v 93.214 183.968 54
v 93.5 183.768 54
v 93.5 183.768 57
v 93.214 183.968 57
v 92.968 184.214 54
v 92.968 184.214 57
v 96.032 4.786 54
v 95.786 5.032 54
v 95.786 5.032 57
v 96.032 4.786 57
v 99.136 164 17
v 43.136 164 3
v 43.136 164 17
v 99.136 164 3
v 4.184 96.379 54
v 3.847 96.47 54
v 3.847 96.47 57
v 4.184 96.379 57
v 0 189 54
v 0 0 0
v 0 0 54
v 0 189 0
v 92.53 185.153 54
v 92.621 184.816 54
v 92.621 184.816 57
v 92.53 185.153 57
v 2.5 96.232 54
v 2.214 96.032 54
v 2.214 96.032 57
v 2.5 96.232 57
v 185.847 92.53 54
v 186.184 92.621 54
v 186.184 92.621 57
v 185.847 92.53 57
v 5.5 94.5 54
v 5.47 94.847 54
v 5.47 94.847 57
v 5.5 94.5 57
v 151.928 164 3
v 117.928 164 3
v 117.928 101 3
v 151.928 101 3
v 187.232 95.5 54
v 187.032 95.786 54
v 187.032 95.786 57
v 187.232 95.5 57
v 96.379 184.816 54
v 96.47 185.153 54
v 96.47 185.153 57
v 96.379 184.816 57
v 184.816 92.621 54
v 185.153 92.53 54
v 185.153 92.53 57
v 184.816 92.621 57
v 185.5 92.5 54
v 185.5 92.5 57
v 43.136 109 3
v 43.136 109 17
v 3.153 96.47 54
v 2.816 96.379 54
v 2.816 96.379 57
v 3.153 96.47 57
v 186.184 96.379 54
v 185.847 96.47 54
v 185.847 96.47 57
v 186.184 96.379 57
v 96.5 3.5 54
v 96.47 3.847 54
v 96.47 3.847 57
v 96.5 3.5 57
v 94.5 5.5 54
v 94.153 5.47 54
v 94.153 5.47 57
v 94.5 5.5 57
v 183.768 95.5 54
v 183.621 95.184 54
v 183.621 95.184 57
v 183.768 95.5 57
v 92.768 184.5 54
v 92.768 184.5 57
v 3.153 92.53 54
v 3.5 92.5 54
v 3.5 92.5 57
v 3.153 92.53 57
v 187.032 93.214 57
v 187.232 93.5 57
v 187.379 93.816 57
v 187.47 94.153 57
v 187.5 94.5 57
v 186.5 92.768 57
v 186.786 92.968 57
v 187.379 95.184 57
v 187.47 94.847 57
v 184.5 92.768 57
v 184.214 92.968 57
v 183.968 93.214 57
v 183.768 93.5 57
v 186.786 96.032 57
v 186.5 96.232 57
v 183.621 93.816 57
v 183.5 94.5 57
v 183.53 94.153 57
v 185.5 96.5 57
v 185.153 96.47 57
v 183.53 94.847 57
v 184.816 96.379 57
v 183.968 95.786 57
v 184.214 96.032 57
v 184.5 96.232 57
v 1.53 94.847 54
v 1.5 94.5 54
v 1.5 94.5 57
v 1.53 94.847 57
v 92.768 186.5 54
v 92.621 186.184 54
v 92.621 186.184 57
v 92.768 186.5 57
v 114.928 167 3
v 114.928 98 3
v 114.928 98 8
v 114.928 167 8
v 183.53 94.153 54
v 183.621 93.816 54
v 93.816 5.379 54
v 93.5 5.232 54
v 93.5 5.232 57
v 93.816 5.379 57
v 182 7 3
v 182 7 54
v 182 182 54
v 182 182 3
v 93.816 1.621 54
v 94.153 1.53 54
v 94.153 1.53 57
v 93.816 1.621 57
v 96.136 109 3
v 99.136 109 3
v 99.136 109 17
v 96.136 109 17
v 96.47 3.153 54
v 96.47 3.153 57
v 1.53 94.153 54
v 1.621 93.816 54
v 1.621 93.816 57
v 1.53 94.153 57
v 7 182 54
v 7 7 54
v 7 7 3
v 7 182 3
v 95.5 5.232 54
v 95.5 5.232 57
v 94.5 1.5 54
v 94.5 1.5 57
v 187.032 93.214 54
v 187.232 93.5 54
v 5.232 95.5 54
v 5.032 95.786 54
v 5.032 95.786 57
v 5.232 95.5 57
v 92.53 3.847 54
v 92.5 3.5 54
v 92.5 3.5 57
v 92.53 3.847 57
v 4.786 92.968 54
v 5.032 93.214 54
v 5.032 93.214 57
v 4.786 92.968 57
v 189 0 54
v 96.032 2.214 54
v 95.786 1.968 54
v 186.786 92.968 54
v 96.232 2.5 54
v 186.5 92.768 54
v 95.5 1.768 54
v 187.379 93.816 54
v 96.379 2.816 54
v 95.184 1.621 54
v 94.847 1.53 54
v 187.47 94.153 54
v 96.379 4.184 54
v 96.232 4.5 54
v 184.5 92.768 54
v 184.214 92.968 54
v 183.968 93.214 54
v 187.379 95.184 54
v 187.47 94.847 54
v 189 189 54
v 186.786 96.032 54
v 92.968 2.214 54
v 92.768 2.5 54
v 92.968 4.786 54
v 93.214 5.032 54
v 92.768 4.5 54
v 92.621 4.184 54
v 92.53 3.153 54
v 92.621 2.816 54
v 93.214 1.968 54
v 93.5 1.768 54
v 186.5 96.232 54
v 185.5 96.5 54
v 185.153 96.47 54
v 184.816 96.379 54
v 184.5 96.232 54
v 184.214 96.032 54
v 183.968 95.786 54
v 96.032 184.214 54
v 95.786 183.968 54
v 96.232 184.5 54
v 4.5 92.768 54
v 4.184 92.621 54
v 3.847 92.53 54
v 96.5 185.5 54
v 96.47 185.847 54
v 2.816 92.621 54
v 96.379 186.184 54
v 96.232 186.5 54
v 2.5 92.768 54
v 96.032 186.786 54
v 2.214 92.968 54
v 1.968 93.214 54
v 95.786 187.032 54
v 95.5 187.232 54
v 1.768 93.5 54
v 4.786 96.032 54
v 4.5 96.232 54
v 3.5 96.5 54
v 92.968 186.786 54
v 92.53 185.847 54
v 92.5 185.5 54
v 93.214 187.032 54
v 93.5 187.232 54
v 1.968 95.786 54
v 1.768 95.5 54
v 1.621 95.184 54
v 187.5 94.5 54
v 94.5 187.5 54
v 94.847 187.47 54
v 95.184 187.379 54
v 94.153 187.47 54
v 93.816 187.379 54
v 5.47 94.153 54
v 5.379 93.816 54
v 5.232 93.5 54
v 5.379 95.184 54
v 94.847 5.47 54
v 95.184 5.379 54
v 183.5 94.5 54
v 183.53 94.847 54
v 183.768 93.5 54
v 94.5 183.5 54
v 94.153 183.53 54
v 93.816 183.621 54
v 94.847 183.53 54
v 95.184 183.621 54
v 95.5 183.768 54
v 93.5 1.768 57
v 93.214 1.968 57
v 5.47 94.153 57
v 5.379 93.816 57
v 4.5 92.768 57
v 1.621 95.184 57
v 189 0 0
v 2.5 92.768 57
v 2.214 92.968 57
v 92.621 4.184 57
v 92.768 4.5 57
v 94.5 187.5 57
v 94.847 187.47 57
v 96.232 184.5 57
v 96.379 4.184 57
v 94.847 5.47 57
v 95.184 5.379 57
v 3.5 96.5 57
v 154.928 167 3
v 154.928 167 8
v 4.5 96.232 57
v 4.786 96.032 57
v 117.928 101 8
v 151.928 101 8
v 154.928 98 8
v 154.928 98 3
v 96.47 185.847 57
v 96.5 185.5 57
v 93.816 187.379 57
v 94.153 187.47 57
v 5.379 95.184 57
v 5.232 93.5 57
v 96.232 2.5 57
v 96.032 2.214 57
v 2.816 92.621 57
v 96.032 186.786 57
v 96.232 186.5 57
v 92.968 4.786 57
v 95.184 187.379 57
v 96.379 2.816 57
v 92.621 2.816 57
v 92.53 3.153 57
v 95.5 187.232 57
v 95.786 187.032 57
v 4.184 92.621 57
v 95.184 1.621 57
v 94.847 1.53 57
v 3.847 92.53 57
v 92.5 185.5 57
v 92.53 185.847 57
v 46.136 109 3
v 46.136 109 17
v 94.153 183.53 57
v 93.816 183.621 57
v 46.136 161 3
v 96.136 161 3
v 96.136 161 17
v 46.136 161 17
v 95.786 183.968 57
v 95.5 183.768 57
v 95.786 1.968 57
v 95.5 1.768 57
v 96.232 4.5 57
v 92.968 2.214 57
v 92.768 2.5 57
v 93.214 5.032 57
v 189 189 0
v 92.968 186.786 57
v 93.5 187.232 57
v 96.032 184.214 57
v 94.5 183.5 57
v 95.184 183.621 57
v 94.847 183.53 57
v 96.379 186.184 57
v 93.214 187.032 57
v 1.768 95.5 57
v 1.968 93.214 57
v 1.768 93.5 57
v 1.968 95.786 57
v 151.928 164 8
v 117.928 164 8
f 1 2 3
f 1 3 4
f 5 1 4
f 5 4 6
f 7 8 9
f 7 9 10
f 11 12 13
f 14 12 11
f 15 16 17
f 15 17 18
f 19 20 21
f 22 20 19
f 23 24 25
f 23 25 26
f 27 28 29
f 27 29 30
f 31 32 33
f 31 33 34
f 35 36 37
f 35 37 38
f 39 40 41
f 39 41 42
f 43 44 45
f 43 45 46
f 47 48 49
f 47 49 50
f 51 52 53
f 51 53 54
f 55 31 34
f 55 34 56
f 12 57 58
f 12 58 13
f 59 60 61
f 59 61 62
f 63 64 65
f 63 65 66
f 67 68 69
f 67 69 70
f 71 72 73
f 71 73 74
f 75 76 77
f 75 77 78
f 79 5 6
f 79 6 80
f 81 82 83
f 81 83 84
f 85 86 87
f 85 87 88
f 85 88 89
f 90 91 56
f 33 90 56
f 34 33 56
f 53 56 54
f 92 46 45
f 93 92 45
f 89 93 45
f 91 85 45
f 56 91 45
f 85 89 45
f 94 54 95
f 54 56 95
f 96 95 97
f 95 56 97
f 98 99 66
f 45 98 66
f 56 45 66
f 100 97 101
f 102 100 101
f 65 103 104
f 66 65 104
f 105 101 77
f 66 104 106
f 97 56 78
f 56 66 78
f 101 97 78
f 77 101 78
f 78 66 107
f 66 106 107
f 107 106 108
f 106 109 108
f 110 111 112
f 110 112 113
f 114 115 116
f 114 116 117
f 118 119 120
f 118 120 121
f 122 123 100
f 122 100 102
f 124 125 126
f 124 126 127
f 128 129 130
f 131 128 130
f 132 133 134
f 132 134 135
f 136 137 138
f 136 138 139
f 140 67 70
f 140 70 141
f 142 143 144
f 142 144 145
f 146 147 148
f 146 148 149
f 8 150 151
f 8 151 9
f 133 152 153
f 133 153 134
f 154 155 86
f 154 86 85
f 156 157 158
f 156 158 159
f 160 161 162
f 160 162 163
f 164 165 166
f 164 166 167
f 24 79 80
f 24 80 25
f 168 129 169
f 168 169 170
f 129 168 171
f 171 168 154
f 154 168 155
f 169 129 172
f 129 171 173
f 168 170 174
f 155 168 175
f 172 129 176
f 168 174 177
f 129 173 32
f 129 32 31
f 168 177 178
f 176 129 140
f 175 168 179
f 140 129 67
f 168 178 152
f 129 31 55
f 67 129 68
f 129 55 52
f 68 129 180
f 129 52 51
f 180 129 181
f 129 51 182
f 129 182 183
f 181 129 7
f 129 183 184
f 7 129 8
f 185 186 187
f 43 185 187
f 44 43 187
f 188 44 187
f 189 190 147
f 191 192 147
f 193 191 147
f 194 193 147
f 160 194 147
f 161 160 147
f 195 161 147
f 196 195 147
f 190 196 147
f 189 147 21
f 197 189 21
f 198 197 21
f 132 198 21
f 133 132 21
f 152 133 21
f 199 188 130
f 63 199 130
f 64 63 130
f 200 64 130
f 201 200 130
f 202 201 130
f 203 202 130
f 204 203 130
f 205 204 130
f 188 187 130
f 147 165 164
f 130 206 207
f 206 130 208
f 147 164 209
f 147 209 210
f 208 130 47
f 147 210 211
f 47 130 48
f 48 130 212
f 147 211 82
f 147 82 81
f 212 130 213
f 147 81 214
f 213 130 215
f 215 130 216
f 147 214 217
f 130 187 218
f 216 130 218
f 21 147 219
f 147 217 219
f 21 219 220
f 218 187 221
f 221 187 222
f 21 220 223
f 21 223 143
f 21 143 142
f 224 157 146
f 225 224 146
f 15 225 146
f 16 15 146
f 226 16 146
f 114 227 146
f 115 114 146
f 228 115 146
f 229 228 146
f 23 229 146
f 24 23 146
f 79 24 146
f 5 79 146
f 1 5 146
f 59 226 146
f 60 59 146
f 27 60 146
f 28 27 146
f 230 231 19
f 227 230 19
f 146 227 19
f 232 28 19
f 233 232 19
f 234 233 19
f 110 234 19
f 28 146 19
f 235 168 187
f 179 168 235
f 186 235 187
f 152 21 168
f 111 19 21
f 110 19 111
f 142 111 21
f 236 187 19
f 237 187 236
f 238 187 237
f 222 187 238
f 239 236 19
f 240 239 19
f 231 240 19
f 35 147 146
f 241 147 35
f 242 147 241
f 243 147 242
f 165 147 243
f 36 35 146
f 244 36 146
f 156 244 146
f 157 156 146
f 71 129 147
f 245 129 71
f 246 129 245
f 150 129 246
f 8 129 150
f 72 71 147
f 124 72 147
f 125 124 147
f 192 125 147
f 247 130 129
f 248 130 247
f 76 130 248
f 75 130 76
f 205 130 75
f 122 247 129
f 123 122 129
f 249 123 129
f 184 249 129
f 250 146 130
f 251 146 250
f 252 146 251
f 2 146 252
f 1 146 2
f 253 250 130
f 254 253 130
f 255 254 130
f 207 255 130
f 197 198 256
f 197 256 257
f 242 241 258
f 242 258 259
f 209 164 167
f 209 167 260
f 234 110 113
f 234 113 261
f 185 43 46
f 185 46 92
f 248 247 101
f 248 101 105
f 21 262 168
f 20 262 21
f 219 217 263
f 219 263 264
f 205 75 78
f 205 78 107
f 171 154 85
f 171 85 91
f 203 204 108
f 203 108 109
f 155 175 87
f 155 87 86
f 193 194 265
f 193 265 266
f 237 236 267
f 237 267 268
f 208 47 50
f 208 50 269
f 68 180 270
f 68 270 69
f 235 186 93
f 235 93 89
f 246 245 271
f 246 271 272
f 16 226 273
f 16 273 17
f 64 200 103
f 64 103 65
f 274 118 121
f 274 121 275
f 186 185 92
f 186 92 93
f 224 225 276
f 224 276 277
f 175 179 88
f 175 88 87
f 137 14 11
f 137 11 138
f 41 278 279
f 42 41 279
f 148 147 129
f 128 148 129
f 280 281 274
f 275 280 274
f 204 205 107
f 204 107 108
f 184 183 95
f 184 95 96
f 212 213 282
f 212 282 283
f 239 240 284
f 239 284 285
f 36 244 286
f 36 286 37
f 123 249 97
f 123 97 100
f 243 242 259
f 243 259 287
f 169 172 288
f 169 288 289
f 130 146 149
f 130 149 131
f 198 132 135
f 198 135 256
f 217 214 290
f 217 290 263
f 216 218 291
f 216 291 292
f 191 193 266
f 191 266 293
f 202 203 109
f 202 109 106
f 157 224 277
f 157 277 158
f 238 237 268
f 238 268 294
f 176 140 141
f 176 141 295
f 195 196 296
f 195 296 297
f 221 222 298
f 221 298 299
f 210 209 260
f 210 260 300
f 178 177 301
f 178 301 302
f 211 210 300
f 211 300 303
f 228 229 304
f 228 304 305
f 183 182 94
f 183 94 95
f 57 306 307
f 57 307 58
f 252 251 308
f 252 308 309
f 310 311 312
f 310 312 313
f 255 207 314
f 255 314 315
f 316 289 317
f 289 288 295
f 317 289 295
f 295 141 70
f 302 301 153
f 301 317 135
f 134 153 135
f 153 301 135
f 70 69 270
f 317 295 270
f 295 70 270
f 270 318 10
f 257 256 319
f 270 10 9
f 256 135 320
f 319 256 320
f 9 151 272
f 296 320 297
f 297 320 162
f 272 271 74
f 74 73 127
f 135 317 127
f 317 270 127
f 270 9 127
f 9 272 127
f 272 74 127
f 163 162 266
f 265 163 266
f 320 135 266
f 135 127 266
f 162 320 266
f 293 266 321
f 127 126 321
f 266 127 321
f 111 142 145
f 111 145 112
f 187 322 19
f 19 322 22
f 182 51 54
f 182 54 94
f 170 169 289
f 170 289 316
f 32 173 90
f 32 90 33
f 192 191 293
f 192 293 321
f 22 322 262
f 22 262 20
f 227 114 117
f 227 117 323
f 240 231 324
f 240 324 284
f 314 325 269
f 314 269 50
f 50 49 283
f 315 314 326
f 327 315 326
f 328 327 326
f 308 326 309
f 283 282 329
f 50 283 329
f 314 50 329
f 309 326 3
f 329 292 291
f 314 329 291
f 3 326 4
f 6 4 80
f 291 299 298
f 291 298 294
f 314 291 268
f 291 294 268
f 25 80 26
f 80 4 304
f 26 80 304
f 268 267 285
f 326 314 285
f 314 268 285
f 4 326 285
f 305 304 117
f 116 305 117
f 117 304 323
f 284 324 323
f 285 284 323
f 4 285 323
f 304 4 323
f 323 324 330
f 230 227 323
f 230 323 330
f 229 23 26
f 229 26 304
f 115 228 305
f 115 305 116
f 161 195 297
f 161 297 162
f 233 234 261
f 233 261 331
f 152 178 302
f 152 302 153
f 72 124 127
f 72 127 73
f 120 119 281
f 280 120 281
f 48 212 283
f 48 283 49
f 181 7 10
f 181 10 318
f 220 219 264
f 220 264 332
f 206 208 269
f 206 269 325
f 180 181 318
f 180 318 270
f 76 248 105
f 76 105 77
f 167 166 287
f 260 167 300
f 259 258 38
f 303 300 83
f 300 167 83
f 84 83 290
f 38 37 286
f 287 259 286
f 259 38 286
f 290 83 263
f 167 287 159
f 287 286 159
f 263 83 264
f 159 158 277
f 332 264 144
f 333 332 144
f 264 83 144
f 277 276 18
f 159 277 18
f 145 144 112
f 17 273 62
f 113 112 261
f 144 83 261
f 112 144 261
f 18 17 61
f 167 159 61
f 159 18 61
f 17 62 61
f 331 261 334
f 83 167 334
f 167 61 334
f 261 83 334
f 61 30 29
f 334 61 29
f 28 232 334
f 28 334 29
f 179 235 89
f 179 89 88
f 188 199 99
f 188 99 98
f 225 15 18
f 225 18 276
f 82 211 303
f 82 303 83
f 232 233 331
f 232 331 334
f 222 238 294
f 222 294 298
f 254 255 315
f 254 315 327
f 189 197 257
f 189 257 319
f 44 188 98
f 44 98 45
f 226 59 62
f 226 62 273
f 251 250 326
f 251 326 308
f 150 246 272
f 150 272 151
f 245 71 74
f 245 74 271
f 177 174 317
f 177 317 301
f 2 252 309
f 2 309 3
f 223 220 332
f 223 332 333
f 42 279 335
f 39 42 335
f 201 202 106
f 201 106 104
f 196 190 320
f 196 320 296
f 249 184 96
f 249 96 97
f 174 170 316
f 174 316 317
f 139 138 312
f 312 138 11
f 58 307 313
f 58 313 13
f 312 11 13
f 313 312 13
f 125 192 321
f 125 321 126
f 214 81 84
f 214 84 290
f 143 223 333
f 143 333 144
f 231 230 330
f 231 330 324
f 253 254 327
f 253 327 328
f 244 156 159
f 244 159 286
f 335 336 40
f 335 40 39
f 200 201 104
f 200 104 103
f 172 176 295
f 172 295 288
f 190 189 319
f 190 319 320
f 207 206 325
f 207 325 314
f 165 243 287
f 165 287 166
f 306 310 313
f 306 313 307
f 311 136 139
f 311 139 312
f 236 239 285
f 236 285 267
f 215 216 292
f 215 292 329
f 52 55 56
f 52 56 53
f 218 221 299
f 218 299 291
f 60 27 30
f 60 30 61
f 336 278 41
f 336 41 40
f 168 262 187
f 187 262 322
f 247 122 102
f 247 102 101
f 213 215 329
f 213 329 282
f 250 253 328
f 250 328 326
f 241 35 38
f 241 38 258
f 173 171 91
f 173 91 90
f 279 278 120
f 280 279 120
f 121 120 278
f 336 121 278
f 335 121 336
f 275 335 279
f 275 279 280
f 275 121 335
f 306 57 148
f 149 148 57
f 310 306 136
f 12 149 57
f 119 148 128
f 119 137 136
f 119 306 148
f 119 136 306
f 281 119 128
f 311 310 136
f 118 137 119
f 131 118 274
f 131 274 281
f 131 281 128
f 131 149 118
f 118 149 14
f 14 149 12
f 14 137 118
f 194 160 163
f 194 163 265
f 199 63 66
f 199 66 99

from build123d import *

# Parameters (mm, degrees)
SKETCH1_W           = 188.999995589
SKETCH1_H           = 188.999995589
BOSS_EXTRUDE1_DEPTH = 54.000001401
BOSS_EXTRUDE2_DEPTH = 2.999998629
BOSS_EXTRUDE3_DEPTH = 2.999998629
BOSS_EXTRUDE4_DEPTH = 2.999998629
BOSS_EXTRUDE5_DEPTH = 2.999998629
SKETCH6_W           = 174.999997486
SKETCH6_H           = 174.999997486
CUT_EXTRUDE1_DEPTH  = 51.000001375
BOSS_EXTRUDE6_DEPTH = 14.000000898
SKETCH8_W           = 40.000014007
SKETCH8_H           = 68.999998271
BOSS_EXTRUDE7_DEPTH = 5.000000354
SKETCH9_W           = 34.000001848
SKETCH9_H           = 63.000008464
CUT_EXTRUDE2_DEPTH  = 5.000000354


with BuildPart() as part:
    # Sketch1 → Boss-Extrude1 (new body)
    with BuildSketch(Plane(origin=(0, 0, 0), x_dir=(-1, 0, 0), z_dir=(0, 0, -1))):
        with Locations((-94.499997795, 94.499997795)):
            Rectangle(SKETCH1_W, SKETCH1_H)
    extrude(amount=-BOSS_EXTRUDE1_DEPTH)

    # Sketch2 → Boss-Extrude2 (add)
    with BuildSketch(Plane.XY.offset(54.000001401)):
        Polygon((3.152705729, 96.469610929), (3.49999941, 96.500001848), (3.847301006, 96.469610929), (4.184044898, 96.379376948), (4.500002135, 96.232049167), (4.785574973, 96.032083035), (5.032091867, 95.785565674), (5.232051015, 95.499992371), (5.379386246, 95.184035599), (5.469620228, 94.847291708), (5.500003695, 94.499990344), (5.469620228, 94.152703881), (5.379386246, 93.815952539), (5.232051015, 93.499995768), (5.032091867, 93.214422464), (4.785574973, 92.967912555), (4.500002135, 92.767946422), (4.184044898, 92.620611191), (3.847301006, 92.530377209), (3.49999941, 92.500001192), (3.152705729, 92.530377209), (2.815961838, 92.620611191), (2.500005066, 92.767946422), (2.214424312, 92.967912555), (1.967914402, 93.214422464), (1.76794827, 93.499995768), (1.620620489, 93.815952539), (1.530386391, 94.152703881), (1.500003156, 94.499990344), (1.530386391, 94.847291708), (1.620620489, 95.184035599), (1.76794827, 95.499992371), (1.967914402, 95.785565674), (2.214424312, 96.032083035), (2.500005066, 96.232049167), (2.815961838, 96.379376948), align=None)
    extrude(amount=BOSS_EXTRUDE2_DEPTH)

    # Sketch3 → Boss-Extrude3 (add)
    with BuildSketch(Plane.XY.offset(54.000001401)):
        Polygon((96.032090485, 184.214413166), (95.785573125, 183.967918158), (95.499999821, 183.767944574), (95.18404305, 183.620601892), (94.847299159, 183.530375361), (94.499997795, 183.500006795), (94.152703881, 183.530375361), (93.815967441, 183.620601892), (93.500003219, 183.767944574), (93.214422464, 183.967918158), (92.967912555, 184.214413166), (92.767953873, 184.49999392), (92.620611191, 184.815958142), (92.53038466, 185.152694583), (92.500001192, 185.499995947), (92.53038466, 185.847297311), (92.620611191, 186.184033751), (92.767953873, 186.499997973), (92.967912555, 186.785563827), (93.214422464, 187.032088637), (93.500003219, 187.232047319), (93.815967441, 187.3793751), (94.152703881, 187.469601631), (94.499997795, 187.5), (94.847299159, 187.469601631), (95.18404305, 187.3793751), (95.499999821, 187.232047319), (95.785573125, 187.032088637), (96.032090485, 186.785563827), (96.232056618, 186.499997973), (96.379384398, 186.184033751), (96.46961838, 185.847297311), (96.500001848, 185.499995947), (96.46961838, 185.152694583), (96.379384398, 184.815958142), (96.232056618, 184.49999392), align=None)
    extrude(amount=BOSS_EXTRUDE3_DEPTH)

    # Sketch4 → Boss-Extrude4 (add)
    with BuildSketch(Plane.XY.offset(54.000001401)):
        Polygon((185.847297311, 92.530377209), (185.499995947, 92.500001192), (185.152694583, 92.530377209), (184.815958142, 92.620611191), (184.49999392, 92.767946422), (184.214428067, 92.967912555), (183.967918158, 93.214422464), (183.767959476, 93.499995768), (183.620616794, 93.815952539), (183.530375361, 94.152703881), (183.500006795, 94.499990344), (183.530375361, 94.847291708), (183.620616794, 95.184035599), (183.767959476, 95.499992371), (183.967918158, 95.785565674), (184.214428067, 96.032083035), (184.49999392, 96.232049167), (184.815958142, 96.379376948), (185.152694583, 96.469610929), (185.499995947, 96.500001848), (185.847297311, 96.469610929), (186.184033751, 96.379376948), (186.499997973, 96.232049167), (186.785578728, 96.032083035), (187.032088637, 95.785565674), (187.232062221, 95.499992371), (187.379390001, 95.184035599), (187.469616532, 94.847291708), (187.5, 94.499990344), (187.469616532, 94.152703881), (187.379390001, 93.815952539), (187.232062221, 93.499995768), (187.032088637, 93.214422464), (186.785578728, 92.967912555), (186.499997973, 92.767946422), (186.184033751, 92.620611191), align=None)
    extrude(amount=BOSS_EXTRUDE4_DEPTH)

    # Sketch5 → Boss-Extrude5 (add)
    with BuildSketch(Plane.XY.offset(54.000001401)):
        Polygon((92.967912555, 2.214424312), (92.767953873, 2.499997616), (92.620611191, 2.815954387), (92.53038466, 3.152698278), (92.500001192, 3.49999941), (92.53038466, 3.847293556), (92.620611191, 4.184036981), (92.767953873, 4.499994218), (92.967912555, 4.785574973), (93.214422464, 5.032084882), (93.500003219, 5.232051015), (93.815967441, 5.379378796), (94.152703881, 5.469612777), (94.499997795, 5.499996245), (94.847299159, 5.469612777), (95.18404305, 5.379378796), (95.499999821, 5.232051015), (95.785573125, 5.032084882), (96.032090485, 4.785574973), (96.232056618, 4.499994218), (96.379384398, 4.184036981), (96.46961838, 3.847293556), (96.500001848, 3.49999941), (96.46961838, 3.152698278), (96.379384398, 2.815954387), (96.232056618, 2.499997616), (96.032090485, 2.214424312), (95.785573125, 1.967906952), (95.499999821, 1.76794827), (95.18404305, 1.620613155), (94.847299159, 1.530379057), (94.499997795, 1.499995589), (94.152703881, 1.530379057), (93.815967441, 1.620613155), (93.500003219, 1.76794827), (93.214422464, 1.967906952), align=None)
    extrude(amount=BOSS_EXTRUDE5_DEPTH)

    # Sketch6 → Cut-Extrude1 (cut)
    with BuildSketch(Plane.XY.offset(54.000001401)):
        with Locations((94.499997562, 94.499997562)):
            Rectangle(SKETCH6_W, SKETCH6_H)
    extrude(amount=-CUT_EXTRUDE1_DEPTH, mode=Mode.SUBTRACT)

    # Sketch7 → Boss-Extrude6 (add)
    with BuildSketch(Plane.XY.offset(3.000000026)):
        Polygon((96.136428416, 160.99999845), (46.136427671, 160.99999845), (46.136427671, 108.999997377), (43.136429042, 108.999997377), (43.136429042, 164.00000453), (99.136427045, 164.00000453), (99.136427045, 108.999997377), (96.136428416, 108.999997377), align=None)
    extrude(amount=BOSS_EXTRUDE6_DEPTH)

    # Sketch8 → Boss-Extrude7 (add)
    with BuildSketch(Plane.XY.offset(3.000000026)):
        with Locations((134.927961976, 132.499996573)):
            Rectangle(SKETCH8_W, SKETCH8_H)
    extrude(amount=BOSS_EXTRUDE7_DEPTH)

    # Sketch9 → Cut-Extrude2 (cut)
    with BuildSketch(Plane.XY.offset(8.00000038)):
        with Locations((134.927961975, 132.500000298)):
            Rectangle(SKETCH9_W, SKETCH9_H)
    extrude(amount=-CUT_EXTRUDE2_DEPTH, mode=Mode.SUBTRACT)


solid = part.part
